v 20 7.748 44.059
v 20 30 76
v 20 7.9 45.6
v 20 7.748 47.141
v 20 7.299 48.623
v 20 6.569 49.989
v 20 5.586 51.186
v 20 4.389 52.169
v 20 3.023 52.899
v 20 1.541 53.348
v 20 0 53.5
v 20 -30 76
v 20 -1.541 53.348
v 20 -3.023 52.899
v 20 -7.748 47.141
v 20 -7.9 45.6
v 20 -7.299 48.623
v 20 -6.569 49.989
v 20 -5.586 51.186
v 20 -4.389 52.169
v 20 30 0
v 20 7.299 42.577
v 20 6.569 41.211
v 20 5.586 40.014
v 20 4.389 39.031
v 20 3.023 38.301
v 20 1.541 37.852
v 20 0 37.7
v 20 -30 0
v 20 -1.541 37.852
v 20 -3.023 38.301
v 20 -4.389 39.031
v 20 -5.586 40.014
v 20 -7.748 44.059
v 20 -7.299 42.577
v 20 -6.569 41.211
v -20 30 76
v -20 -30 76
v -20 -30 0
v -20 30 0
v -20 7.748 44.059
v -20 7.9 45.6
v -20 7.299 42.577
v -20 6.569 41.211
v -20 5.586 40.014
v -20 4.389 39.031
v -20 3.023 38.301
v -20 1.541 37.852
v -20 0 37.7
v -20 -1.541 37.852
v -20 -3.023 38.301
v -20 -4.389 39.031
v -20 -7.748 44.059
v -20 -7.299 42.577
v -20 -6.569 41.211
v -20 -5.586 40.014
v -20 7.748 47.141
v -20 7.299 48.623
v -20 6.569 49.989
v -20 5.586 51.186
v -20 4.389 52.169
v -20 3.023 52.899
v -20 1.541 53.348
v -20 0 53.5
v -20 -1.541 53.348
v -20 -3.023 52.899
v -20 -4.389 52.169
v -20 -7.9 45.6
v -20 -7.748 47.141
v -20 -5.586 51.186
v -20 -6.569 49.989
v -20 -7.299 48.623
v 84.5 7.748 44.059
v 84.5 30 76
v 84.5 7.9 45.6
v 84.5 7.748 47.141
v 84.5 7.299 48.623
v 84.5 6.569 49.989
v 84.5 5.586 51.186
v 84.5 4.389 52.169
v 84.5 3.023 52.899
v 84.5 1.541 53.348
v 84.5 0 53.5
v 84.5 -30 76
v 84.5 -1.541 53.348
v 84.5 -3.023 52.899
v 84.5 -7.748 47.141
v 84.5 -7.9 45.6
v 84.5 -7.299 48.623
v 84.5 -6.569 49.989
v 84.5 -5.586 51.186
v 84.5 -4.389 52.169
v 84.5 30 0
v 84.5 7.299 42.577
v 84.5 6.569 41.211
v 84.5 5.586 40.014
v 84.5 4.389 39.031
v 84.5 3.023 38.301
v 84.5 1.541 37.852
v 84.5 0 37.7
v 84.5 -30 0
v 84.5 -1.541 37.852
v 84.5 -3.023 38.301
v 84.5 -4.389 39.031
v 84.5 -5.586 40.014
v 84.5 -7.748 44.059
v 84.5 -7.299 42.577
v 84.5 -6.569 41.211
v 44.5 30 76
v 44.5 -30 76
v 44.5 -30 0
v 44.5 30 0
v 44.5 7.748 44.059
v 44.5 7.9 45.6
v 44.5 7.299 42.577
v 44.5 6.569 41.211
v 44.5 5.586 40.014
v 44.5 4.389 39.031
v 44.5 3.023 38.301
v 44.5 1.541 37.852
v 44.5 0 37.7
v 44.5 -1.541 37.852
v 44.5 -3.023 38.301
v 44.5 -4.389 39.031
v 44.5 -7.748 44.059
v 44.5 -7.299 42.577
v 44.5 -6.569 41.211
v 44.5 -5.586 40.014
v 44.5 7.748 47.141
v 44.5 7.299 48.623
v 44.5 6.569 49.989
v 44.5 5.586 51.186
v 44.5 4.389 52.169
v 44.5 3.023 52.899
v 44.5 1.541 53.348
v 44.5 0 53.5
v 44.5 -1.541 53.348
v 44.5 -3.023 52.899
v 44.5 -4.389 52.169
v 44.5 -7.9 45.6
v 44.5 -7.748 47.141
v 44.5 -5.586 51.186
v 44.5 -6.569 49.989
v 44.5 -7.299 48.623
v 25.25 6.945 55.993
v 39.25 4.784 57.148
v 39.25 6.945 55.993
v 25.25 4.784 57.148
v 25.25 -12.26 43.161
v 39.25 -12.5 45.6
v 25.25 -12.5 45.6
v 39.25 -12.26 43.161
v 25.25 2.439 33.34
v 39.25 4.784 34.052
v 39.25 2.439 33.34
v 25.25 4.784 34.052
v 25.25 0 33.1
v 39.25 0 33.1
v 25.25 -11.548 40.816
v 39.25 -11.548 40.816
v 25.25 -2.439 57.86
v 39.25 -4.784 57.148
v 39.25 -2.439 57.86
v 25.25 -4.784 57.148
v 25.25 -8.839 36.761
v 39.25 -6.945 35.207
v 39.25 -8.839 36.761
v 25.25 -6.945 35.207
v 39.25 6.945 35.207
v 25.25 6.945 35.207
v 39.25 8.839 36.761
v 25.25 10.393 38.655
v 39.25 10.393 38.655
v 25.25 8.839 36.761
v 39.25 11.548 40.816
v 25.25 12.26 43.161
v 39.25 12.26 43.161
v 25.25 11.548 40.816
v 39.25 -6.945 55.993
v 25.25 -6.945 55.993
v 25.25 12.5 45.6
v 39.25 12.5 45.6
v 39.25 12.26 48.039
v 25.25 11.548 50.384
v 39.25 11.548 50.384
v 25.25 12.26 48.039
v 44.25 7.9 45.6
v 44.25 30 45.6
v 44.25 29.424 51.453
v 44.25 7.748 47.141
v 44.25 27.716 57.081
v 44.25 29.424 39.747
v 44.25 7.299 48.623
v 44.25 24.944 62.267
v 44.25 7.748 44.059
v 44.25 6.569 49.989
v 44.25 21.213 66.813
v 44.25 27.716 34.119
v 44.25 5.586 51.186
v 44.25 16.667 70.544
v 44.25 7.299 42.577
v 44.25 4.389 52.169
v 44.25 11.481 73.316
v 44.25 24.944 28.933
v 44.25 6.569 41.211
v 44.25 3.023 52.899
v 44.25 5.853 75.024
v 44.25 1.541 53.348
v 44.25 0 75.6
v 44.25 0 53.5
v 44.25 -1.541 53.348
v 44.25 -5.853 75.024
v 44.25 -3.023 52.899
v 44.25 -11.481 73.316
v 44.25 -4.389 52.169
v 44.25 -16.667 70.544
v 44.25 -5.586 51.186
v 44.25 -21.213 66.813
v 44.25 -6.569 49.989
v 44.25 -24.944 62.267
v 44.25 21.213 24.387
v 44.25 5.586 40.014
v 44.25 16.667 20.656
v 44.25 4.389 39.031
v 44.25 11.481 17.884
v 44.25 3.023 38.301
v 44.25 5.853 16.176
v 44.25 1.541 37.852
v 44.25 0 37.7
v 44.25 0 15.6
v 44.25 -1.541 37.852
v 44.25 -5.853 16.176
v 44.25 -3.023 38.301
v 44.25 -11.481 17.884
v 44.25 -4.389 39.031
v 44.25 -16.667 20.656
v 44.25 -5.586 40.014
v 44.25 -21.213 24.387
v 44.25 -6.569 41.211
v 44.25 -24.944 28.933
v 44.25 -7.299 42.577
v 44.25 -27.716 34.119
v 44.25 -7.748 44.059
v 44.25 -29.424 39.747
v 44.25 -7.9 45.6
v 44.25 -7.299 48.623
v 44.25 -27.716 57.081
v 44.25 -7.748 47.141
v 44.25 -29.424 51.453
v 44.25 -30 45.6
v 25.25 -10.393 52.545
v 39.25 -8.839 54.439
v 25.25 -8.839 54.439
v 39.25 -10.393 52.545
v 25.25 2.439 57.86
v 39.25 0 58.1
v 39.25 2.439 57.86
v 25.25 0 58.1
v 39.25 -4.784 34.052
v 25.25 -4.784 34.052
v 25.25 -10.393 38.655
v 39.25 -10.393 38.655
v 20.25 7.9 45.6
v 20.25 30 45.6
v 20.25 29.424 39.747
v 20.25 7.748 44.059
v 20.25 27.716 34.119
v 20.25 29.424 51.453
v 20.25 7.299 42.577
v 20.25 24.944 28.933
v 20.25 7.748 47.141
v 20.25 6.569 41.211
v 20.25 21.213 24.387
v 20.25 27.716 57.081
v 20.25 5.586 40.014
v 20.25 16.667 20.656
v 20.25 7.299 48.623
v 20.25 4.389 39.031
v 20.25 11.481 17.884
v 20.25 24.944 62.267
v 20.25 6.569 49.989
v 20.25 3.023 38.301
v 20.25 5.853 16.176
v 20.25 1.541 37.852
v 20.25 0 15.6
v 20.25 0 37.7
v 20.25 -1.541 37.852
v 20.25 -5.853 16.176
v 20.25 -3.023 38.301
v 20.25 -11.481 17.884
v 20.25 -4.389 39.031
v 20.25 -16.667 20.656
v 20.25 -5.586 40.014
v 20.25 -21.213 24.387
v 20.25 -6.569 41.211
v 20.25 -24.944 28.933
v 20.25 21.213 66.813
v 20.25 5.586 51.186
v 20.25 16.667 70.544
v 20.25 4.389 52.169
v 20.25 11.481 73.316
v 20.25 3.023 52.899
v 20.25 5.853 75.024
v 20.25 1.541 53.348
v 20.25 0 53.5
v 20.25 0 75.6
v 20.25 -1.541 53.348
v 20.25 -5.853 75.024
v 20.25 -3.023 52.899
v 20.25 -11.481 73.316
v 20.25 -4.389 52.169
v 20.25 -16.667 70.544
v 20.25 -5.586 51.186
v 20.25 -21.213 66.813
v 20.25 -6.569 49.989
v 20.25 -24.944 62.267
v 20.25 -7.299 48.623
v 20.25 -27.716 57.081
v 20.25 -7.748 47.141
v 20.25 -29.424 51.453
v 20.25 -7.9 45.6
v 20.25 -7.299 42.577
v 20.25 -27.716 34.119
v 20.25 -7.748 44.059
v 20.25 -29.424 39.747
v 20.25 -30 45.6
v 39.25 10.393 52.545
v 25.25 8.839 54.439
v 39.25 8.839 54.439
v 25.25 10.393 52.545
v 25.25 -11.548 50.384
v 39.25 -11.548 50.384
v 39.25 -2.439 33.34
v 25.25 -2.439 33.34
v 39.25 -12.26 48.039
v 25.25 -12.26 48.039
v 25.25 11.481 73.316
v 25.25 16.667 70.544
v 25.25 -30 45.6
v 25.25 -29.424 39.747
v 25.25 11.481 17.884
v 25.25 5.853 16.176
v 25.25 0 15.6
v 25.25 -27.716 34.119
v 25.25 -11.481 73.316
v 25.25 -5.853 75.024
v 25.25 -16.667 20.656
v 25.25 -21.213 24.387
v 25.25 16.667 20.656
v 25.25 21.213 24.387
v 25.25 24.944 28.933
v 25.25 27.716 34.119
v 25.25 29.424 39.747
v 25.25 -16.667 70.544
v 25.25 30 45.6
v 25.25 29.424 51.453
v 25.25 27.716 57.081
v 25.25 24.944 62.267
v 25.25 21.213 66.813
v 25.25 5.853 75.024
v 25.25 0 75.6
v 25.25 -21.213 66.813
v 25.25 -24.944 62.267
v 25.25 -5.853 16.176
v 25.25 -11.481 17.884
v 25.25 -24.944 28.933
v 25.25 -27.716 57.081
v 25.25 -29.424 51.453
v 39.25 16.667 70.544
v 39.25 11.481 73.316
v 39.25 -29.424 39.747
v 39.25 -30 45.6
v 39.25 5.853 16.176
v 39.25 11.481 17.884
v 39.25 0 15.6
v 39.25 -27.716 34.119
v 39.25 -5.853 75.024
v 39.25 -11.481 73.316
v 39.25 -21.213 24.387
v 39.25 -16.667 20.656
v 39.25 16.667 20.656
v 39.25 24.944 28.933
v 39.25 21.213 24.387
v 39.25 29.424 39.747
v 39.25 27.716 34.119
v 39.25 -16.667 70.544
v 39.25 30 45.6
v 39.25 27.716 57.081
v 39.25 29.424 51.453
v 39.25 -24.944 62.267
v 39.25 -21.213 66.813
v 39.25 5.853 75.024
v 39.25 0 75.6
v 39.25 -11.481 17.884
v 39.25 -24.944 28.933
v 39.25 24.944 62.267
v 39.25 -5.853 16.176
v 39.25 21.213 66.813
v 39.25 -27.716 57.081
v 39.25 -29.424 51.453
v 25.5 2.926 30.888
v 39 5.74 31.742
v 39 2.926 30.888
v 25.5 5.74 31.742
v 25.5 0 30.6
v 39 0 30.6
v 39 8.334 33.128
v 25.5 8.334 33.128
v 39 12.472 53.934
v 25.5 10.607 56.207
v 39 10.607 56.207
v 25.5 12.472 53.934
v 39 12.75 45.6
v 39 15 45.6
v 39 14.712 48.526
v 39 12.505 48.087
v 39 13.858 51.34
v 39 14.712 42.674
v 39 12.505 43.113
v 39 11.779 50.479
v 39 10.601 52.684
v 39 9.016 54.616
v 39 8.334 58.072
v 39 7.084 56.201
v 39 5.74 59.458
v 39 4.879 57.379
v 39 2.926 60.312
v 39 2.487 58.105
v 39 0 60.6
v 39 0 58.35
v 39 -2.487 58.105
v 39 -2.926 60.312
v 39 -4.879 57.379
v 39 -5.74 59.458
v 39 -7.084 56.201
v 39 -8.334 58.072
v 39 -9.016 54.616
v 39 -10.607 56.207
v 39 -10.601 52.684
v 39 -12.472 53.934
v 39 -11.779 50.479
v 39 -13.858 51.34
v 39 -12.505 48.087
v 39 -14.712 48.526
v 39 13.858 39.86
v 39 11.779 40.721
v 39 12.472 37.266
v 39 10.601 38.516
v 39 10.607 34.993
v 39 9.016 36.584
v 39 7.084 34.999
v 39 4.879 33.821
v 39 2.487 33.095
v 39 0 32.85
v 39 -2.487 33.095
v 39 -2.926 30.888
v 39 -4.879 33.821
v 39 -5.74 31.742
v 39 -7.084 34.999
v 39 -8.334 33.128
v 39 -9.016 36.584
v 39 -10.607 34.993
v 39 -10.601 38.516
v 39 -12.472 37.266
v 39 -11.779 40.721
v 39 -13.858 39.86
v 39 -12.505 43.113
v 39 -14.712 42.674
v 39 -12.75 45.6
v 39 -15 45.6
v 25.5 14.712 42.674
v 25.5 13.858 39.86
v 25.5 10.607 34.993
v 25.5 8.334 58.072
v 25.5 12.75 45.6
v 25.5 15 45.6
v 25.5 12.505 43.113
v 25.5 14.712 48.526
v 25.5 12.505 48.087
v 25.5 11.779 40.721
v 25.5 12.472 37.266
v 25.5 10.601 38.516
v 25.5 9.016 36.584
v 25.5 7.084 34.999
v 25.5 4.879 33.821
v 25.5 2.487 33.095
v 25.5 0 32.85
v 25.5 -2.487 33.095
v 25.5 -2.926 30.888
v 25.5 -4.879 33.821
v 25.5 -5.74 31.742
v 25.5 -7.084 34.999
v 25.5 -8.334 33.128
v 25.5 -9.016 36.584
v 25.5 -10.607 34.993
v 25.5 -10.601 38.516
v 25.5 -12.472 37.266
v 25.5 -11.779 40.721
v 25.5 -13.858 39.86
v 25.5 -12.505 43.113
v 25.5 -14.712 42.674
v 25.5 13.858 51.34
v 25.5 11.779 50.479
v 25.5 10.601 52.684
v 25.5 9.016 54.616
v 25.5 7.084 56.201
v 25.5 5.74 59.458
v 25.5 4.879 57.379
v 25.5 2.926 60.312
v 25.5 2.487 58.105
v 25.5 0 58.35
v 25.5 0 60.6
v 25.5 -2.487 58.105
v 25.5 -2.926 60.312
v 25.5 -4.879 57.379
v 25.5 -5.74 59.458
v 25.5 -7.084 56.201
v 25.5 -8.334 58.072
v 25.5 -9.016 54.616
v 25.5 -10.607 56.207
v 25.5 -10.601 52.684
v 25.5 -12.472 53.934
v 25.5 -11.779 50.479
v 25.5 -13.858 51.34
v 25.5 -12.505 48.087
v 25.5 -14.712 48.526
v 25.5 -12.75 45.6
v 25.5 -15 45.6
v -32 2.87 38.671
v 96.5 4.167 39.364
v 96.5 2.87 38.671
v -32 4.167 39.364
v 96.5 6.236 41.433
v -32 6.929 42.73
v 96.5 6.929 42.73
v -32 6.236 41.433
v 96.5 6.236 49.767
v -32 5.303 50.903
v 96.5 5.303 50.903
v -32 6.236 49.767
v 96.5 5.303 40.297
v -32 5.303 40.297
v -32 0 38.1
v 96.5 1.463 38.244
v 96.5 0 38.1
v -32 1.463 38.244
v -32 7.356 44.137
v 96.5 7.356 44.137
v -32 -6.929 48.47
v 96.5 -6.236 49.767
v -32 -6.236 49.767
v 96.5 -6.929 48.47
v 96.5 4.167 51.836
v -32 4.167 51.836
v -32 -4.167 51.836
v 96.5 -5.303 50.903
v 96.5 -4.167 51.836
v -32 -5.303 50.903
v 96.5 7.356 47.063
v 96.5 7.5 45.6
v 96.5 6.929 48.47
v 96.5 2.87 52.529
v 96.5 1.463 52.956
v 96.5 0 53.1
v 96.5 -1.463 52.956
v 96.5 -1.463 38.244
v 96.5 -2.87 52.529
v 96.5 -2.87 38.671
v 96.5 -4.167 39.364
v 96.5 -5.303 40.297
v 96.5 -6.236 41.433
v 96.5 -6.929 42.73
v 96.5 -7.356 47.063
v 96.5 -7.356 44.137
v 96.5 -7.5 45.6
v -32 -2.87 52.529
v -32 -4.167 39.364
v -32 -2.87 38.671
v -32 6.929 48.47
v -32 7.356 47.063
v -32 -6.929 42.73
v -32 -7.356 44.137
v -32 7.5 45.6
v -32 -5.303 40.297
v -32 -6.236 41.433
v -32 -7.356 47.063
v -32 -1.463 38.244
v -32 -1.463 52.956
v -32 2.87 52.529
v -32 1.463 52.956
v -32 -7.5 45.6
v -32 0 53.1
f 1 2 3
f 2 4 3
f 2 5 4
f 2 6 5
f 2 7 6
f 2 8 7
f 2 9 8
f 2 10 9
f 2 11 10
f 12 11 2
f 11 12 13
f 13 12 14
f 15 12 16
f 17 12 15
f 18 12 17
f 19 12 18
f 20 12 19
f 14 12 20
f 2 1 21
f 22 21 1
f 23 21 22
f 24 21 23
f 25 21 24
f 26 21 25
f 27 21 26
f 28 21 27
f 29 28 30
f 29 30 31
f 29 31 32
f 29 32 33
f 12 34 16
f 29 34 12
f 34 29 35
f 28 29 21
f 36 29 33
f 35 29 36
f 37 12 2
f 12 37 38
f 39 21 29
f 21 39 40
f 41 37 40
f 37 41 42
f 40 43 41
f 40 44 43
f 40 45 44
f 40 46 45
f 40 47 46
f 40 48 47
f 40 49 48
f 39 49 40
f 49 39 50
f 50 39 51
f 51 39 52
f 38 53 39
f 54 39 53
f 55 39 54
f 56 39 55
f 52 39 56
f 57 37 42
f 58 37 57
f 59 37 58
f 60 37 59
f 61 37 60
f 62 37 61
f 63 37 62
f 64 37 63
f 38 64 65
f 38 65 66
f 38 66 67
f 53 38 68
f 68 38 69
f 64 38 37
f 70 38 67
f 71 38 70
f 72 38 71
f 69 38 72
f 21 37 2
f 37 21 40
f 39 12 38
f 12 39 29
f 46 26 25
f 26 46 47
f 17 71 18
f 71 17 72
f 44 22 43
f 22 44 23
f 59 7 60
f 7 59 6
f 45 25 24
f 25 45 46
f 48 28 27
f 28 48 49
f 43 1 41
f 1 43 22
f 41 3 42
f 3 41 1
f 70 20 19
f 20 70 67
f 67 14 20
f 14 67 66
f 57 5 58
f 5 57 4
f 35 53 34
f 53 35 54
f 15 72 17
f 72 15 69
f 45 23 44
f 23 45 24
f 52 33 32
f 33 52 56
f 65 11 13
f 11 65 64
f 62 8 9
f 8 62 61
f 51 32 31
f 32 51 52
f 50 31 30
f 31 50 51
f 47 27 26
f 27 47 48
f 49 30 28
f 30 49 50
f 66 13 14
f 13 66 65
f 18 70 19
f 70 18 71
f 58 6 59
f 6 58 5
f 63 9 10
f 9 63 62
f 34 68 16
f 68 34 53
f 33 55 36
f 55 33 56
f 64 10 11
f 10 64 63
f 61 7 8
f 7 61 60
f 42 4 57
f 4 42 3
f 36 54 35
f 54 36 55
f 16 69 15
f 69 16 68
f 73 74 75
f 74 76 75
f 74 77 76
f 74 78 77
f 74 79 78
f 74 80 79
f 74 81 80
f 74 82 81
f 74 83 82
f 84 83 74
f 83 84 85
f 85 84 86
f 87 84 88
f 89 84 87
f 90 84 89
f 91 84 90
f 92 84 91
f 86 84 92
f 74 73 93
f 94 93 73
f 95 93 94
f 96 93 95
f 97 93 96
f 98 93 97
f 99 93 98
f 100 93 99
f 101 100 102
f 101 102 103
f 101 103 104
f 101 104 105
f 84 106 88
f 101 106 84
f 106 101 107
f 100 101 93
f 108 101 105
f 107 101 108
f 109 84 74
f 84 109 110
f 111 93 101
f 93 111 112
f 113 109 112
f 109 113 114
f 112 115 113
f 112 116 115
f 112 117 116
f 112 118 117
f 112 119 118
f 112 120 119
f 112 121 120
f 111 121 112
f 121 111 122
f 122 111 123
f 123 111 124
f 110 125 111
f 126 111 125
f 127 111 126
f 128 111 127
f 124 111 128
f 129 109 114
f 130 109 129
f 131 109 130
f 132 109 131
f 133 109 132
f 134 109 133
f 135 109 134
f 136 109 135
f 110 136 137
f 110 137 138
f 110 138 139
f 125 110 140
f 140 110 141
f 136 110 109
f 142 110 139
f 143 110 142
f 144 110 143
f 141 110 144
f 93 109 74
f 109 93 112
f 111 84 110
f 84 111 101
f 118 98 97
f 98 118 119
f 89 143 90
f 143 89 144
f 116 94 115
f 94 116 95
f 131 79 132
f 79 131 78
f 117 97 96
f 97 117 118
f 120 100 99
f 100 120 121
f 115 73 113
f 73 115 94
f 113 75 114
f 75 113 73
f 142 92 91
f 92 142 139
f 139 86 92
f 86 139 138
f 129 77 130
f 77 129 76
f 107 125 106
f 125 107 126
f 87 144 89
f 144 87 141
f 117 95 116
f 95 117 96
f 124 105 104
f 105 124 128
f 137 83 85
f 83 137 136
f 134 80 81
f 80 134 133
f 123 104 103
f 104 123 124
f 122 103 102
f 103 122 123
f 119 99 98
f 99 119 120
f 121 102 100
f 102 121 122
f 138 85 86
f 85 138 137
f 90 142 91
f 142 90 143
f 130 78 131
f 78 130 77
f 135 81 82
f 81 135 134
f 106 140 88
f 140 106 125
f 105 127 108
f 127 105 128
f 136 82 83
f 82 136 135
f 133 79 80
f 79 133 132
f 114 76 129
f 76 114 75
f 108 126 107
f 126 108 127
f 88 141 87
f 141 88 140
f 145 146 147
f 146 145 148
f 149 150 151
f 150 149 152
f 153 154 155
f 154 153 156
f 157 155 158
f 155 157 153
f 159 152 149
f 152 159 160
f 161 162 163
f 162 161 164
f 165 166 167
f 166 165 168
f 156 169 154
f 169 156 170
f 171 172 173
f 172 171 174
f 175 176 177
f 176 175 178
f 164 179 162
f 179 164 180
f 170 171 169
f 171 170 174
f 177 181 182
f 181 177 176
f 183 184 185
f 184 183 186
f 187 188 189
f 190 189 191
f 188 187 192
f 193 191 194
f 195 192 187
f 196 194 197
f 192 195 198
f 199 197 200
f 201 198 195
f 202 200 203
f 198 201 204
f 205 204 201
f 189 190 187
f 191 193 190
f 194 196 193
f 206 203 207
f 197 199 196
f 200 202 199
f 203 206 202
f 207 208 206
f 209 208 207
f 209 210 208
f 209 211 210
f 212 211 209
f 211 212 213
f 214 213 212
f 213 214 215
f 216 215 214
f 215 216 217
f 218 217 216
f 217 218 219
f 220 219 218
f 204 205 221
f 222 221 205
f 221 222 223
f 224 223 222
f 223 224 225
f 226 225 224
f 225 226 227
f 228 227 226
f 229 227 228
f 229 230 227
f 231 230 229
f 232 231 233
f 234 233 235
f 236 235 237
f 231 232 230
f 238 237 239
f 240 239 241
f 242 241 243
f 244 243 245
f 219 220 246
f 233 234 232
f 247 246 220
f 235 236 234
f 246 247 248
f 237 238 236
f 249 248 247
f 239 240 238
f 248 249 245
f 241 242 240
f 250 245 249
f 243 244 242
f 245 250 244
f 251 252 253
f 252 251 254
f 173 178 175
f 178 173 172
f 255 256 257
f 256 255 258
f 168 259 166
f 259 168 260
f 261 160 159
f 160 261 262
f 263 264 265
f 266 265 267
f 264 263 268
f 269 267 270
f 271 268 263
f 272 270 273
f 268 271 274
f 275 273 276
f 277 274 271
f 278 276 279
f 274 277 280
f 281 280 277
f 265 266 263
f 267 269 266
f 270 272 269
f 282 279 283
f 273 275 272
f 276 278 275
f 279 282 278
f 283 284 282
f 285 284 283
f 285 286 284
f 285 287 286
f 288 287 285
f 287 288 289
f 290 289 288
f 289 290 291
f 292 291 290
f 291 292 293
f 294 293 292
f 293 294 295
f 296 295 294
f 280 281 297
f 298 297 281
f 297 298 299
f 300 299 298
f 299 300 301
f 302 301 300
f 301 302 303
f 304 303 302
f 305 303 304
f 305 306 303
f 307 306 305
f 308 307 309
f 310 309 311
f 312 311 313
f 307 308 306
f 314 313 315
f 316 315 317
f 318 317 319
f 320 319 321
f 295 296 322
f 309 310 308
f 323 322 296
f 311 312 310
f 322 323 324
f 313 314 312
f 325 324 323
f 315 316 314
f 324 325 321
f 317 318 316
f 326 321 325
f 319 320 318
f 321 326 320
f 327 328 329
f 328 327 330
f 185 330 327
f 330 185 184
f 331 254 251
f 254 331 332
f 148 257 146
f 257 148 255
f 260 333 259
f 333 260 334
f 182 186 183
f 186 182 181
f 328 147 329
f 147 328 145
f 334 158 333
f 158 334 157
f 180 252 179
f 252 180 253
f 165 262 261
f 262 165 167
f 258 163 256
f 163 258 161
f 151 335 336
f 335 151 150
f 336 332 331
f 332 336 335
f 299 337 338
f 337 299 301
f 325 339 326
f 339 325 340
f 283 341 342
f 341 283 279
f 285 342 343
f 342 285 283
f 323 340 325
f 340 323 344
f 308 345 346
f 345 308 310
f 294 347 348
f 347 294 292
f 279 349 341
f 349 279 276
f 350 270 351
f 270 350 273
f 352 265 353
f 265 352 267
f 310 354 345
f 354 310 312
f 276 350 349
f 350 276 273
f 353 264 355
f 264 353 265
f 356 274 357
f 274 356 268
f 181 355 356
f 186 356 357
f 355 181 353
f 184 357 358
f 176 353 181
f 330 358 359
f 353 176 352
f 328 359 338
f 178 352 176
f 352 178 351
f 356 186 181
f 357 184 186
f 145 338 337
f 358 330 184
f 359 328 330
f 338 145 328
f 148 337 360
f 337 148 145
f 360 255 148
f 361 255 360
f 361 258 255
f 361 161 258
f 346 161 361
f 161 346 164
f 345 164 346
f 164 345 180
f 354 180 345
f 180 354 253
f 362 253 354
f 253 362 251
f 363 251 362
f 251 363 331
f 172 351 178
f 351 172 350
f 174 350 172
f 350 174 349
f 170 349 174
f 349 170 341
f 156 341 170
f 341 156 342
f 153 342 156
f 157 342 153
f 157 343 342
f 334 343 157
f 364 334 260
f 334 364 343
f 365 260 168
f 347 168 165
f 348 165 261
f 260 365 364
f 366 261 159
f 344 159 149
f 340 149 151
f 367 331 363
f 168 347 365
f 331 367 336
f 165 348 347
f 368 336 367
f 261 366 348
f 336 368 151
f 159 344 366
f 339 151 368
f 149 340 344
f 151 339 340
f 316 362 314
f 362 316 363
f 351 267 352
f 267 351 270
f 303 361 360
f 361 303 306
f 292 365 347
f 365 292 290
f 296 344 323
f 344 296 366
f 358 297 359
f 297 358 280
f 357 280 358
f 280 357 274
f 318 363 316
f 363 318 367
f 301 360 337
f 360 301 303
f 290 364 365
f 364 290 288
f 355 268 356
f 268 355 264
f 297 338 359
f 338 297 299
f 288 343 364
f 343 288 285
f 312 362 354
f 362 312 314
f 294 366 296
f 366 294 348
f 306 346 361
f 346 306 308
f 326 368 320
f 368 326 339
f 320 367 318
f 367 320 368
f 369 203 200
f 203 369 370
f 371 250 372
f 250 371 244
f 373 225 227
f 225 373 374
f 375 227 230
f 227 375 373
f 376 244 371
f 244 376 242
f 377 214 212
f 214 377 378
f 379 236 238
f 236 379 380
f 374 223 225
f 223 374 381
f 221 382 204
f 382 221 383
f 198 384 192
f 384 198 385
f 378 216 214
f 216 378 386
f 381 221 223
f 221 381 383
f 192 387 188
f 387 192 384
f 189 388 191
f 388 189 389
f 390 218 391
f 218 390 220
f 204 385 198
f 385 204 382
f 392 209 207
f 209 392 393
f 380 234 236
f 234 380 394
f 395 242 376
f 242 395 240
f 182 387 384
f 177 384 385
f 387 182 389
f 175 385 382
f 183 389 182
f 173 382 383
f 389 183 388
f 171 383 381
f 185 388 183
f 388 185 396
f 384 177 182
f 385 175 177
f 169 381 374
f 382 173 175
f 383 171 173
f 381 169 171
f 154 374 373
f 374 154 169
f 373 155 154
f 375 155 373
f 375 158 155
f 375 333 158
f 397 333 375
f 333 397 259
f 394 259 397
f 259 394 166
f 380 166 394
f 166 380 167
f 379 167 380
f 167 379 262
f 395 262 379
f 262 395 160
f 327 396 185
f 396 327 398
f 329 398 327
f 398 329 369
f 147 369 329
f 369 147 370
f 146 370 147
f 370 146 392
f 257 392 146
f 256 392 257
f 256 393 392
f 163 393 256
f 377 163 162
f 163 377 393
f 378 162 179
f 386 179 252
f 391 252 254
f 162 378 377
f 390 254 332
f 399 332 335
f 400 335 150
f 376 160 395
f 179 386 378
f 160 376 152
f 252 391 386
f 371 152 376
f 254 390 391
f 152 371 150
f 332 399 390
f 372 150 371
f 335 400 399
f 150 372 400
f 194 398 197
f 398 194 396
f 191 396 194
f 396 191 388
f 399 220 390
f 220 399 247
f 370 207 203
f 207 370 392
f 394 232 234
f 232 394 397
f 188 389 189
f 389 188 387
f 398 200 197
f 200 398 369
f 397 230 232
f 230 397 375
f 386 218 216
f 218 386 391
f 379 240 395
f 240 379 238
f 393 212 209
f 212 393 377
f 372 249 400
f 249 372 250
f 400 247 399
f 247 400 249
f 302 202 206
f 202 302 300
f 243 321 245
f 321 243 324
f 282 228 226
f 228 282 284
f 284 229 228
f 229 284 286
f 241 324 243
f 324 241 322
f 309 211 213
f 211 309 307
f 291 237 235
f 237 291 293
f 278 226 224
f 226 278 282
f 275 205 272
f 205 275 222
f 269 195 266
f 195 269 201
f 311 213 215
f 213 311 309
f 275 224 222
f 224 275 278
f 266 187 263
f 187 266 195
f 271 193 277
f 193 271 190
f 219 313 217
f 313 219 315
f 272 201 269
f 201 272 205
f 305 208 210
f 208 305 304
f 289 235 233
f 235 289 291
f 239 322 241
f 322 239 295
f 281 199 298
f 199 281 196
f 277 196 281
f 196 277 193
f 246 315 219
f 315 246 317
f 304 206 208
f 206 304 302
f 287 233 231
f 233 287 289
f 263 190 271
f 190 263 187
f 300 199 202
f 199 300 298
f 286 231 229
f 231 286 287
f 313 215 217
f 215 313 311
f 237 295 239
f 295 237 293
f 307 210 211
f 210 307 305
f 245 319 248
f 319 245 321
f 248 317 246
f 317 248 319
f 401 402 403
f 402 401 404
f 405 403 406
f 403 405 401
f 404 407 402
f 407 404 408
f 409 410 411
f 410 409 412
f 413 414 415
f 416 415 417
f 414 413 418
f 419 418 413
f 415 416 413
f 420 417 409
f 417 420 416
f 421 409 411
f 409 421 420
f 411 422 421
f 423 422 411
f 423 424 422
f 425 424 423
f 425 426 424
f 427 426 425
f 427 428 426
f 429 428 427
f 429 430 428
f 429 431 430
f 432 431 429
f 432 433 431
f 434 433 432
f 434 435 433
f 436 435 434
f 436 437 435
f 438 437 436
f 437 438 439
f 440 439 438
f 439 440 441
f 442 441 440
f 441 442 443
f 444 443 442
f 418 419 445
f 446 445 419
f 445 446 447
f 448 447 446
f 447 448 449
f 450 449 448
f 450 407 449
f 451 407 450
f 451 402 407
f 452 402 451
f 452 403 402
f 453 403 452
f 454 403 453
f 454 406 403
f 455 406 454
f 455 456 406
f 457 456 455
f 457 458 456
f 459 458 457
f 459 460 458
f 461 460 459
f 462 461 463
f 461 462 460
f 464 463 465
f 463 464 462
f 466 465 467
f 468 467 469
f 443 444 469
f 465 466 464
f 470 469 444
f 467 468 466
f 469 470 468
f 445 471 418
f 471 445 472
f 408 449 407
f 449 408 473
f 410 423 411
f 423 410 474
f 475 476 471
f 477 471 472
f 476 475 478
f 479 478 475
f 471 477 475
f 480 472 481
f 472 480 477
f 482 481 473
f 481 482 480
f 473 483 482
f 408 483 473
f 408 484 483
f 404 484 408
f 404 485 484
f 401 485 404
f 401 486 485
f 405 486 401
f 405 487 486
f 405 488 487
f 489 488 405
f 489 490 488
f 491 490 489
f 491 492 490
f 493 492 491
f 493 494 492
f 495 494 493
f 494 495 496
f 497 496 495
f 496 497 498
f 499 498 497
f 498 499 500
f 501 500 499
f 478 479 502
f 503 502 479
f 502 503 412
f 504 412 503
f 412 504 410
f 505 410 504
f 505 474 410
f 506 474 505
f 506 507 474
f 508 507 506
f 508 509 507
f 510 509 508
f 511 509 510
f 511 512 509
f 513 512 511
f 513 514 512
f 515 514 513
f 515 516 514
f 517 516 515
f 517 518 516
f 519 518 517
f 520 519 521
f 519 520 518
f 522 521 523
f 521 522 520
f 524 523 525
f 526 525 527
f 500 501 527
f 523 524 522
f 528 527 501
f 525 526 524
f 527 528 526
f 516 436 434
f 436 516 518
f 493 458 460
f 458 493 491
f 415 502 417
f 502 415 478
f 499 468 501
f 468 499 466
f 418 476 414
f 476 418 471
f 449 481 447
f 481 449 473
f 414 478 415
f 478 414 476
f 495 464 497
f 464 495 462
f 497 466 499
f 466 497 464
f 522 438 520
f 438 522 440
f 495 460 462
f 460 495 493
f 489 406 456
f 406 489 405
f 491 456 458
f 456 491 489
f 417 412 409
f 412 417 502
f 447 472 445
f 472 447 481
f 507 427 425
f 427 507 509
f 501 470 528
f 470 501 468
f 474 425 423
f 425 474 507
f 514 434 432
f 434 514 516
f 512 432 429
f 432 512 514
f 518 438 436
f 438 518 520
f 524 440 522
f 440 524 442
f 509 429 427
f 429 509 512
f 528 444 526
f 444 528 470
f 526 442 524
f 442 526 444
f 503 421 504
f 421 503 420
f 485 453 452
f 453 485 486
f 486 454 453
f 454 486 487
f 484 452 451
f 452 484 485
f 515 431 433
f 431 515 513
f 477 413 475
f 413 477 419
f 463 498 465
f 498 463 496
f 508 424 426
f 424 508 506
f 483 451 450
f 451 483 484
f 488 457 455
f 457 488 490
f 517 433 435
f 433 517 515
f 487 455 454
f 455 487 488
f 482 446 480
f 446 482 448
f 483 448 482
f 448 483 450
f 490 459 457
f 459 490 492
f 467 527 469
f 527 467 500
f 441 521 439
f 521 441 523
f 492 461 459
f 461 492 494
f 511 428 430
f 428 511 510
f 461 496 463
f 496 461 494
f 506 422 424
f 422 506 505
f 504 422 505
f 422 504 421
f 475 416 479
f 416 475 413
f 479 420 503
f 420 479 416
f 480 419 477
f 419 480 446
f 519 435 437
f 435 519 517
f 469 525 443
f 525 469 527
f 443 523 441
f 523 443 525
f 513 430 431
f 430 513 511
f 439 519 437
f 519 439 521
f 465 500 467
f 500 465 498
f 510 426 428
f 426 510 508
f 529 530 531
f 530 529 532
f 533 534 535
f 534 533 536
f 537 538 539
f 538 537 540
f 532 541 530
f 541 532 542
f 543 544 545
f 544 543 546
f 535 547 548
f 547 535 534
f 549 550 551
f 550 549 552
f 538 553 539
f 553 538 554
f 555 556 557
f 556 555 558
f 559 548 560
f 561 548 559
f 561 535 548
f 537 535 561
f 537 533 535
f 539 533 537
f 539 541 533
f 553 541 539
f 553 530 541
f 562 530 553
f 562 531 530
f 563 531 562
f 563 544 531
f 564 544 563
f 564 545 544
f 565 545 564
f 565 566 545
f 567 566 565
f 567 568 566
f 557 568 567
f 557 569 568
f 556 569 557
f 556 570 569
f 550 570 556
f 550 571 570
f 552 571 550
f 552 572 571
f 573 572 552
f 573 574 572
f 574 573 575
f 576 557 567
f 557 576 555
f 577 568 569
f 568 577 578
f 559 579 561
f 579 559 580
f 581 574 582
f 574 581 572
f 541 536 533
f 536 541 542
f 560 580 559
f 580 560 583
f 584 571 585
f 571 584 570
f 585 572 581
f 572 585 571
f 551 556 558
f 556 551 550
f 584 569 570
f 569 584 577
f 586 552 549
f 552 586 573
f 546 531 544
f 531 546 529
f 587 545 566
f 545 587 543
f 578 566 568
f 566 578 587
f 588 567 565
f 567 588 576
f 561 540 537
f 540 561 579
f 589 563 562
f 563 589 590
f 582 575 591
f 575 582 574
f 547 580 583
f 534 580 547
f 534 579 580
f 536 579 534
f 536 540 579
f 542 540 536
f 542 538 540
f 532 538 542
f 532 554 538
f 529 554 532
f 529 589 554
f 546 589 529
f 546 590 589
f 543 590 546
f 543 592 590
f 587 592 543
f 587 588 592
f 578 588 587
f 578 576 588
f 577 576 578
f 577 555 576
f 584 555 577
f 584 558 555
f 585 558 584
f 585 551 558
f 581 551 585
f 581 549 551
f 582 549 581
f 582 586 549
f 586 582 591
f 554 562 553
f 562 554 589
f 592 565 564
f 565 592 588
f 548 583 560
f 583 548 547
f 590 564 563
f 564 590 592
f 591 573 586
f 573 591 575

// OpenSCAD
$fn = 32;

// ------------------------------------------------------------------------
// Pulley assembly: d60 pulley with a belt, shaft d15
// Every part is its own module, assembly() places them once.
// ------------------------------------------------------------------------

// --- part 1 ---
module support1() {
  difference() {
    translate([-20, -30, 0]) cube([40, 60, 76]);
    translate([0, 0, 45.6]) rotate([0, 90, 0]) cylinder(h = 42, d = 15.8, center = true);
  }
}

// --- part 2 ---
module support2() {
  difference() {
    translate([-20, -30, 0]) cube([40, 60, 76]);
    translate([0, 0, 45.6]) rotate([0, 90, 0]) cylinder(h = 42, d = 15.8, center = true);
  }
}

// --- part 3 ---
module shaft() {
  translate([0, 0, -64.25]) cylinder(h = 128.5, d = 15);
}

// --- part 4 ---
module pulley() {
  difference() {
    union() {
      cylinder(h = 24, d = 25);
      cylinder(h = 5, d = 60);
      translate([0, 0, 19]) cylinder(h = 5, d = 60);
    }
    translate([0, 0, -1]) cylinder(h = 26, d = 15.8);
  }
}

// --- part 5 ---
module belt() {
  difference() {
      translate([0, 0, 0]) cylinder(h = 13.5, d = 30);
      translate([0, 0, -1]) cylinder(h = 15.5, d = 25.5);
    }
}

// --- assembly ---
module assembly() {
  translate([0, 0, 0]) rotate([0, 0, 0]) support1();
  translate([64.5, 0, 0]) rotate([0, 0, 0]) support2();
  translate([32.25, 0, 45.6]) rotate([0, 90, 0]) shaft();
  translate([20.25, 0, 45.6]) rotate([0, 90, 0]) pulley();
  translate([25.5, 0, 45.6]) rotate([0, 90, 0]) belt();
}

assembly();
